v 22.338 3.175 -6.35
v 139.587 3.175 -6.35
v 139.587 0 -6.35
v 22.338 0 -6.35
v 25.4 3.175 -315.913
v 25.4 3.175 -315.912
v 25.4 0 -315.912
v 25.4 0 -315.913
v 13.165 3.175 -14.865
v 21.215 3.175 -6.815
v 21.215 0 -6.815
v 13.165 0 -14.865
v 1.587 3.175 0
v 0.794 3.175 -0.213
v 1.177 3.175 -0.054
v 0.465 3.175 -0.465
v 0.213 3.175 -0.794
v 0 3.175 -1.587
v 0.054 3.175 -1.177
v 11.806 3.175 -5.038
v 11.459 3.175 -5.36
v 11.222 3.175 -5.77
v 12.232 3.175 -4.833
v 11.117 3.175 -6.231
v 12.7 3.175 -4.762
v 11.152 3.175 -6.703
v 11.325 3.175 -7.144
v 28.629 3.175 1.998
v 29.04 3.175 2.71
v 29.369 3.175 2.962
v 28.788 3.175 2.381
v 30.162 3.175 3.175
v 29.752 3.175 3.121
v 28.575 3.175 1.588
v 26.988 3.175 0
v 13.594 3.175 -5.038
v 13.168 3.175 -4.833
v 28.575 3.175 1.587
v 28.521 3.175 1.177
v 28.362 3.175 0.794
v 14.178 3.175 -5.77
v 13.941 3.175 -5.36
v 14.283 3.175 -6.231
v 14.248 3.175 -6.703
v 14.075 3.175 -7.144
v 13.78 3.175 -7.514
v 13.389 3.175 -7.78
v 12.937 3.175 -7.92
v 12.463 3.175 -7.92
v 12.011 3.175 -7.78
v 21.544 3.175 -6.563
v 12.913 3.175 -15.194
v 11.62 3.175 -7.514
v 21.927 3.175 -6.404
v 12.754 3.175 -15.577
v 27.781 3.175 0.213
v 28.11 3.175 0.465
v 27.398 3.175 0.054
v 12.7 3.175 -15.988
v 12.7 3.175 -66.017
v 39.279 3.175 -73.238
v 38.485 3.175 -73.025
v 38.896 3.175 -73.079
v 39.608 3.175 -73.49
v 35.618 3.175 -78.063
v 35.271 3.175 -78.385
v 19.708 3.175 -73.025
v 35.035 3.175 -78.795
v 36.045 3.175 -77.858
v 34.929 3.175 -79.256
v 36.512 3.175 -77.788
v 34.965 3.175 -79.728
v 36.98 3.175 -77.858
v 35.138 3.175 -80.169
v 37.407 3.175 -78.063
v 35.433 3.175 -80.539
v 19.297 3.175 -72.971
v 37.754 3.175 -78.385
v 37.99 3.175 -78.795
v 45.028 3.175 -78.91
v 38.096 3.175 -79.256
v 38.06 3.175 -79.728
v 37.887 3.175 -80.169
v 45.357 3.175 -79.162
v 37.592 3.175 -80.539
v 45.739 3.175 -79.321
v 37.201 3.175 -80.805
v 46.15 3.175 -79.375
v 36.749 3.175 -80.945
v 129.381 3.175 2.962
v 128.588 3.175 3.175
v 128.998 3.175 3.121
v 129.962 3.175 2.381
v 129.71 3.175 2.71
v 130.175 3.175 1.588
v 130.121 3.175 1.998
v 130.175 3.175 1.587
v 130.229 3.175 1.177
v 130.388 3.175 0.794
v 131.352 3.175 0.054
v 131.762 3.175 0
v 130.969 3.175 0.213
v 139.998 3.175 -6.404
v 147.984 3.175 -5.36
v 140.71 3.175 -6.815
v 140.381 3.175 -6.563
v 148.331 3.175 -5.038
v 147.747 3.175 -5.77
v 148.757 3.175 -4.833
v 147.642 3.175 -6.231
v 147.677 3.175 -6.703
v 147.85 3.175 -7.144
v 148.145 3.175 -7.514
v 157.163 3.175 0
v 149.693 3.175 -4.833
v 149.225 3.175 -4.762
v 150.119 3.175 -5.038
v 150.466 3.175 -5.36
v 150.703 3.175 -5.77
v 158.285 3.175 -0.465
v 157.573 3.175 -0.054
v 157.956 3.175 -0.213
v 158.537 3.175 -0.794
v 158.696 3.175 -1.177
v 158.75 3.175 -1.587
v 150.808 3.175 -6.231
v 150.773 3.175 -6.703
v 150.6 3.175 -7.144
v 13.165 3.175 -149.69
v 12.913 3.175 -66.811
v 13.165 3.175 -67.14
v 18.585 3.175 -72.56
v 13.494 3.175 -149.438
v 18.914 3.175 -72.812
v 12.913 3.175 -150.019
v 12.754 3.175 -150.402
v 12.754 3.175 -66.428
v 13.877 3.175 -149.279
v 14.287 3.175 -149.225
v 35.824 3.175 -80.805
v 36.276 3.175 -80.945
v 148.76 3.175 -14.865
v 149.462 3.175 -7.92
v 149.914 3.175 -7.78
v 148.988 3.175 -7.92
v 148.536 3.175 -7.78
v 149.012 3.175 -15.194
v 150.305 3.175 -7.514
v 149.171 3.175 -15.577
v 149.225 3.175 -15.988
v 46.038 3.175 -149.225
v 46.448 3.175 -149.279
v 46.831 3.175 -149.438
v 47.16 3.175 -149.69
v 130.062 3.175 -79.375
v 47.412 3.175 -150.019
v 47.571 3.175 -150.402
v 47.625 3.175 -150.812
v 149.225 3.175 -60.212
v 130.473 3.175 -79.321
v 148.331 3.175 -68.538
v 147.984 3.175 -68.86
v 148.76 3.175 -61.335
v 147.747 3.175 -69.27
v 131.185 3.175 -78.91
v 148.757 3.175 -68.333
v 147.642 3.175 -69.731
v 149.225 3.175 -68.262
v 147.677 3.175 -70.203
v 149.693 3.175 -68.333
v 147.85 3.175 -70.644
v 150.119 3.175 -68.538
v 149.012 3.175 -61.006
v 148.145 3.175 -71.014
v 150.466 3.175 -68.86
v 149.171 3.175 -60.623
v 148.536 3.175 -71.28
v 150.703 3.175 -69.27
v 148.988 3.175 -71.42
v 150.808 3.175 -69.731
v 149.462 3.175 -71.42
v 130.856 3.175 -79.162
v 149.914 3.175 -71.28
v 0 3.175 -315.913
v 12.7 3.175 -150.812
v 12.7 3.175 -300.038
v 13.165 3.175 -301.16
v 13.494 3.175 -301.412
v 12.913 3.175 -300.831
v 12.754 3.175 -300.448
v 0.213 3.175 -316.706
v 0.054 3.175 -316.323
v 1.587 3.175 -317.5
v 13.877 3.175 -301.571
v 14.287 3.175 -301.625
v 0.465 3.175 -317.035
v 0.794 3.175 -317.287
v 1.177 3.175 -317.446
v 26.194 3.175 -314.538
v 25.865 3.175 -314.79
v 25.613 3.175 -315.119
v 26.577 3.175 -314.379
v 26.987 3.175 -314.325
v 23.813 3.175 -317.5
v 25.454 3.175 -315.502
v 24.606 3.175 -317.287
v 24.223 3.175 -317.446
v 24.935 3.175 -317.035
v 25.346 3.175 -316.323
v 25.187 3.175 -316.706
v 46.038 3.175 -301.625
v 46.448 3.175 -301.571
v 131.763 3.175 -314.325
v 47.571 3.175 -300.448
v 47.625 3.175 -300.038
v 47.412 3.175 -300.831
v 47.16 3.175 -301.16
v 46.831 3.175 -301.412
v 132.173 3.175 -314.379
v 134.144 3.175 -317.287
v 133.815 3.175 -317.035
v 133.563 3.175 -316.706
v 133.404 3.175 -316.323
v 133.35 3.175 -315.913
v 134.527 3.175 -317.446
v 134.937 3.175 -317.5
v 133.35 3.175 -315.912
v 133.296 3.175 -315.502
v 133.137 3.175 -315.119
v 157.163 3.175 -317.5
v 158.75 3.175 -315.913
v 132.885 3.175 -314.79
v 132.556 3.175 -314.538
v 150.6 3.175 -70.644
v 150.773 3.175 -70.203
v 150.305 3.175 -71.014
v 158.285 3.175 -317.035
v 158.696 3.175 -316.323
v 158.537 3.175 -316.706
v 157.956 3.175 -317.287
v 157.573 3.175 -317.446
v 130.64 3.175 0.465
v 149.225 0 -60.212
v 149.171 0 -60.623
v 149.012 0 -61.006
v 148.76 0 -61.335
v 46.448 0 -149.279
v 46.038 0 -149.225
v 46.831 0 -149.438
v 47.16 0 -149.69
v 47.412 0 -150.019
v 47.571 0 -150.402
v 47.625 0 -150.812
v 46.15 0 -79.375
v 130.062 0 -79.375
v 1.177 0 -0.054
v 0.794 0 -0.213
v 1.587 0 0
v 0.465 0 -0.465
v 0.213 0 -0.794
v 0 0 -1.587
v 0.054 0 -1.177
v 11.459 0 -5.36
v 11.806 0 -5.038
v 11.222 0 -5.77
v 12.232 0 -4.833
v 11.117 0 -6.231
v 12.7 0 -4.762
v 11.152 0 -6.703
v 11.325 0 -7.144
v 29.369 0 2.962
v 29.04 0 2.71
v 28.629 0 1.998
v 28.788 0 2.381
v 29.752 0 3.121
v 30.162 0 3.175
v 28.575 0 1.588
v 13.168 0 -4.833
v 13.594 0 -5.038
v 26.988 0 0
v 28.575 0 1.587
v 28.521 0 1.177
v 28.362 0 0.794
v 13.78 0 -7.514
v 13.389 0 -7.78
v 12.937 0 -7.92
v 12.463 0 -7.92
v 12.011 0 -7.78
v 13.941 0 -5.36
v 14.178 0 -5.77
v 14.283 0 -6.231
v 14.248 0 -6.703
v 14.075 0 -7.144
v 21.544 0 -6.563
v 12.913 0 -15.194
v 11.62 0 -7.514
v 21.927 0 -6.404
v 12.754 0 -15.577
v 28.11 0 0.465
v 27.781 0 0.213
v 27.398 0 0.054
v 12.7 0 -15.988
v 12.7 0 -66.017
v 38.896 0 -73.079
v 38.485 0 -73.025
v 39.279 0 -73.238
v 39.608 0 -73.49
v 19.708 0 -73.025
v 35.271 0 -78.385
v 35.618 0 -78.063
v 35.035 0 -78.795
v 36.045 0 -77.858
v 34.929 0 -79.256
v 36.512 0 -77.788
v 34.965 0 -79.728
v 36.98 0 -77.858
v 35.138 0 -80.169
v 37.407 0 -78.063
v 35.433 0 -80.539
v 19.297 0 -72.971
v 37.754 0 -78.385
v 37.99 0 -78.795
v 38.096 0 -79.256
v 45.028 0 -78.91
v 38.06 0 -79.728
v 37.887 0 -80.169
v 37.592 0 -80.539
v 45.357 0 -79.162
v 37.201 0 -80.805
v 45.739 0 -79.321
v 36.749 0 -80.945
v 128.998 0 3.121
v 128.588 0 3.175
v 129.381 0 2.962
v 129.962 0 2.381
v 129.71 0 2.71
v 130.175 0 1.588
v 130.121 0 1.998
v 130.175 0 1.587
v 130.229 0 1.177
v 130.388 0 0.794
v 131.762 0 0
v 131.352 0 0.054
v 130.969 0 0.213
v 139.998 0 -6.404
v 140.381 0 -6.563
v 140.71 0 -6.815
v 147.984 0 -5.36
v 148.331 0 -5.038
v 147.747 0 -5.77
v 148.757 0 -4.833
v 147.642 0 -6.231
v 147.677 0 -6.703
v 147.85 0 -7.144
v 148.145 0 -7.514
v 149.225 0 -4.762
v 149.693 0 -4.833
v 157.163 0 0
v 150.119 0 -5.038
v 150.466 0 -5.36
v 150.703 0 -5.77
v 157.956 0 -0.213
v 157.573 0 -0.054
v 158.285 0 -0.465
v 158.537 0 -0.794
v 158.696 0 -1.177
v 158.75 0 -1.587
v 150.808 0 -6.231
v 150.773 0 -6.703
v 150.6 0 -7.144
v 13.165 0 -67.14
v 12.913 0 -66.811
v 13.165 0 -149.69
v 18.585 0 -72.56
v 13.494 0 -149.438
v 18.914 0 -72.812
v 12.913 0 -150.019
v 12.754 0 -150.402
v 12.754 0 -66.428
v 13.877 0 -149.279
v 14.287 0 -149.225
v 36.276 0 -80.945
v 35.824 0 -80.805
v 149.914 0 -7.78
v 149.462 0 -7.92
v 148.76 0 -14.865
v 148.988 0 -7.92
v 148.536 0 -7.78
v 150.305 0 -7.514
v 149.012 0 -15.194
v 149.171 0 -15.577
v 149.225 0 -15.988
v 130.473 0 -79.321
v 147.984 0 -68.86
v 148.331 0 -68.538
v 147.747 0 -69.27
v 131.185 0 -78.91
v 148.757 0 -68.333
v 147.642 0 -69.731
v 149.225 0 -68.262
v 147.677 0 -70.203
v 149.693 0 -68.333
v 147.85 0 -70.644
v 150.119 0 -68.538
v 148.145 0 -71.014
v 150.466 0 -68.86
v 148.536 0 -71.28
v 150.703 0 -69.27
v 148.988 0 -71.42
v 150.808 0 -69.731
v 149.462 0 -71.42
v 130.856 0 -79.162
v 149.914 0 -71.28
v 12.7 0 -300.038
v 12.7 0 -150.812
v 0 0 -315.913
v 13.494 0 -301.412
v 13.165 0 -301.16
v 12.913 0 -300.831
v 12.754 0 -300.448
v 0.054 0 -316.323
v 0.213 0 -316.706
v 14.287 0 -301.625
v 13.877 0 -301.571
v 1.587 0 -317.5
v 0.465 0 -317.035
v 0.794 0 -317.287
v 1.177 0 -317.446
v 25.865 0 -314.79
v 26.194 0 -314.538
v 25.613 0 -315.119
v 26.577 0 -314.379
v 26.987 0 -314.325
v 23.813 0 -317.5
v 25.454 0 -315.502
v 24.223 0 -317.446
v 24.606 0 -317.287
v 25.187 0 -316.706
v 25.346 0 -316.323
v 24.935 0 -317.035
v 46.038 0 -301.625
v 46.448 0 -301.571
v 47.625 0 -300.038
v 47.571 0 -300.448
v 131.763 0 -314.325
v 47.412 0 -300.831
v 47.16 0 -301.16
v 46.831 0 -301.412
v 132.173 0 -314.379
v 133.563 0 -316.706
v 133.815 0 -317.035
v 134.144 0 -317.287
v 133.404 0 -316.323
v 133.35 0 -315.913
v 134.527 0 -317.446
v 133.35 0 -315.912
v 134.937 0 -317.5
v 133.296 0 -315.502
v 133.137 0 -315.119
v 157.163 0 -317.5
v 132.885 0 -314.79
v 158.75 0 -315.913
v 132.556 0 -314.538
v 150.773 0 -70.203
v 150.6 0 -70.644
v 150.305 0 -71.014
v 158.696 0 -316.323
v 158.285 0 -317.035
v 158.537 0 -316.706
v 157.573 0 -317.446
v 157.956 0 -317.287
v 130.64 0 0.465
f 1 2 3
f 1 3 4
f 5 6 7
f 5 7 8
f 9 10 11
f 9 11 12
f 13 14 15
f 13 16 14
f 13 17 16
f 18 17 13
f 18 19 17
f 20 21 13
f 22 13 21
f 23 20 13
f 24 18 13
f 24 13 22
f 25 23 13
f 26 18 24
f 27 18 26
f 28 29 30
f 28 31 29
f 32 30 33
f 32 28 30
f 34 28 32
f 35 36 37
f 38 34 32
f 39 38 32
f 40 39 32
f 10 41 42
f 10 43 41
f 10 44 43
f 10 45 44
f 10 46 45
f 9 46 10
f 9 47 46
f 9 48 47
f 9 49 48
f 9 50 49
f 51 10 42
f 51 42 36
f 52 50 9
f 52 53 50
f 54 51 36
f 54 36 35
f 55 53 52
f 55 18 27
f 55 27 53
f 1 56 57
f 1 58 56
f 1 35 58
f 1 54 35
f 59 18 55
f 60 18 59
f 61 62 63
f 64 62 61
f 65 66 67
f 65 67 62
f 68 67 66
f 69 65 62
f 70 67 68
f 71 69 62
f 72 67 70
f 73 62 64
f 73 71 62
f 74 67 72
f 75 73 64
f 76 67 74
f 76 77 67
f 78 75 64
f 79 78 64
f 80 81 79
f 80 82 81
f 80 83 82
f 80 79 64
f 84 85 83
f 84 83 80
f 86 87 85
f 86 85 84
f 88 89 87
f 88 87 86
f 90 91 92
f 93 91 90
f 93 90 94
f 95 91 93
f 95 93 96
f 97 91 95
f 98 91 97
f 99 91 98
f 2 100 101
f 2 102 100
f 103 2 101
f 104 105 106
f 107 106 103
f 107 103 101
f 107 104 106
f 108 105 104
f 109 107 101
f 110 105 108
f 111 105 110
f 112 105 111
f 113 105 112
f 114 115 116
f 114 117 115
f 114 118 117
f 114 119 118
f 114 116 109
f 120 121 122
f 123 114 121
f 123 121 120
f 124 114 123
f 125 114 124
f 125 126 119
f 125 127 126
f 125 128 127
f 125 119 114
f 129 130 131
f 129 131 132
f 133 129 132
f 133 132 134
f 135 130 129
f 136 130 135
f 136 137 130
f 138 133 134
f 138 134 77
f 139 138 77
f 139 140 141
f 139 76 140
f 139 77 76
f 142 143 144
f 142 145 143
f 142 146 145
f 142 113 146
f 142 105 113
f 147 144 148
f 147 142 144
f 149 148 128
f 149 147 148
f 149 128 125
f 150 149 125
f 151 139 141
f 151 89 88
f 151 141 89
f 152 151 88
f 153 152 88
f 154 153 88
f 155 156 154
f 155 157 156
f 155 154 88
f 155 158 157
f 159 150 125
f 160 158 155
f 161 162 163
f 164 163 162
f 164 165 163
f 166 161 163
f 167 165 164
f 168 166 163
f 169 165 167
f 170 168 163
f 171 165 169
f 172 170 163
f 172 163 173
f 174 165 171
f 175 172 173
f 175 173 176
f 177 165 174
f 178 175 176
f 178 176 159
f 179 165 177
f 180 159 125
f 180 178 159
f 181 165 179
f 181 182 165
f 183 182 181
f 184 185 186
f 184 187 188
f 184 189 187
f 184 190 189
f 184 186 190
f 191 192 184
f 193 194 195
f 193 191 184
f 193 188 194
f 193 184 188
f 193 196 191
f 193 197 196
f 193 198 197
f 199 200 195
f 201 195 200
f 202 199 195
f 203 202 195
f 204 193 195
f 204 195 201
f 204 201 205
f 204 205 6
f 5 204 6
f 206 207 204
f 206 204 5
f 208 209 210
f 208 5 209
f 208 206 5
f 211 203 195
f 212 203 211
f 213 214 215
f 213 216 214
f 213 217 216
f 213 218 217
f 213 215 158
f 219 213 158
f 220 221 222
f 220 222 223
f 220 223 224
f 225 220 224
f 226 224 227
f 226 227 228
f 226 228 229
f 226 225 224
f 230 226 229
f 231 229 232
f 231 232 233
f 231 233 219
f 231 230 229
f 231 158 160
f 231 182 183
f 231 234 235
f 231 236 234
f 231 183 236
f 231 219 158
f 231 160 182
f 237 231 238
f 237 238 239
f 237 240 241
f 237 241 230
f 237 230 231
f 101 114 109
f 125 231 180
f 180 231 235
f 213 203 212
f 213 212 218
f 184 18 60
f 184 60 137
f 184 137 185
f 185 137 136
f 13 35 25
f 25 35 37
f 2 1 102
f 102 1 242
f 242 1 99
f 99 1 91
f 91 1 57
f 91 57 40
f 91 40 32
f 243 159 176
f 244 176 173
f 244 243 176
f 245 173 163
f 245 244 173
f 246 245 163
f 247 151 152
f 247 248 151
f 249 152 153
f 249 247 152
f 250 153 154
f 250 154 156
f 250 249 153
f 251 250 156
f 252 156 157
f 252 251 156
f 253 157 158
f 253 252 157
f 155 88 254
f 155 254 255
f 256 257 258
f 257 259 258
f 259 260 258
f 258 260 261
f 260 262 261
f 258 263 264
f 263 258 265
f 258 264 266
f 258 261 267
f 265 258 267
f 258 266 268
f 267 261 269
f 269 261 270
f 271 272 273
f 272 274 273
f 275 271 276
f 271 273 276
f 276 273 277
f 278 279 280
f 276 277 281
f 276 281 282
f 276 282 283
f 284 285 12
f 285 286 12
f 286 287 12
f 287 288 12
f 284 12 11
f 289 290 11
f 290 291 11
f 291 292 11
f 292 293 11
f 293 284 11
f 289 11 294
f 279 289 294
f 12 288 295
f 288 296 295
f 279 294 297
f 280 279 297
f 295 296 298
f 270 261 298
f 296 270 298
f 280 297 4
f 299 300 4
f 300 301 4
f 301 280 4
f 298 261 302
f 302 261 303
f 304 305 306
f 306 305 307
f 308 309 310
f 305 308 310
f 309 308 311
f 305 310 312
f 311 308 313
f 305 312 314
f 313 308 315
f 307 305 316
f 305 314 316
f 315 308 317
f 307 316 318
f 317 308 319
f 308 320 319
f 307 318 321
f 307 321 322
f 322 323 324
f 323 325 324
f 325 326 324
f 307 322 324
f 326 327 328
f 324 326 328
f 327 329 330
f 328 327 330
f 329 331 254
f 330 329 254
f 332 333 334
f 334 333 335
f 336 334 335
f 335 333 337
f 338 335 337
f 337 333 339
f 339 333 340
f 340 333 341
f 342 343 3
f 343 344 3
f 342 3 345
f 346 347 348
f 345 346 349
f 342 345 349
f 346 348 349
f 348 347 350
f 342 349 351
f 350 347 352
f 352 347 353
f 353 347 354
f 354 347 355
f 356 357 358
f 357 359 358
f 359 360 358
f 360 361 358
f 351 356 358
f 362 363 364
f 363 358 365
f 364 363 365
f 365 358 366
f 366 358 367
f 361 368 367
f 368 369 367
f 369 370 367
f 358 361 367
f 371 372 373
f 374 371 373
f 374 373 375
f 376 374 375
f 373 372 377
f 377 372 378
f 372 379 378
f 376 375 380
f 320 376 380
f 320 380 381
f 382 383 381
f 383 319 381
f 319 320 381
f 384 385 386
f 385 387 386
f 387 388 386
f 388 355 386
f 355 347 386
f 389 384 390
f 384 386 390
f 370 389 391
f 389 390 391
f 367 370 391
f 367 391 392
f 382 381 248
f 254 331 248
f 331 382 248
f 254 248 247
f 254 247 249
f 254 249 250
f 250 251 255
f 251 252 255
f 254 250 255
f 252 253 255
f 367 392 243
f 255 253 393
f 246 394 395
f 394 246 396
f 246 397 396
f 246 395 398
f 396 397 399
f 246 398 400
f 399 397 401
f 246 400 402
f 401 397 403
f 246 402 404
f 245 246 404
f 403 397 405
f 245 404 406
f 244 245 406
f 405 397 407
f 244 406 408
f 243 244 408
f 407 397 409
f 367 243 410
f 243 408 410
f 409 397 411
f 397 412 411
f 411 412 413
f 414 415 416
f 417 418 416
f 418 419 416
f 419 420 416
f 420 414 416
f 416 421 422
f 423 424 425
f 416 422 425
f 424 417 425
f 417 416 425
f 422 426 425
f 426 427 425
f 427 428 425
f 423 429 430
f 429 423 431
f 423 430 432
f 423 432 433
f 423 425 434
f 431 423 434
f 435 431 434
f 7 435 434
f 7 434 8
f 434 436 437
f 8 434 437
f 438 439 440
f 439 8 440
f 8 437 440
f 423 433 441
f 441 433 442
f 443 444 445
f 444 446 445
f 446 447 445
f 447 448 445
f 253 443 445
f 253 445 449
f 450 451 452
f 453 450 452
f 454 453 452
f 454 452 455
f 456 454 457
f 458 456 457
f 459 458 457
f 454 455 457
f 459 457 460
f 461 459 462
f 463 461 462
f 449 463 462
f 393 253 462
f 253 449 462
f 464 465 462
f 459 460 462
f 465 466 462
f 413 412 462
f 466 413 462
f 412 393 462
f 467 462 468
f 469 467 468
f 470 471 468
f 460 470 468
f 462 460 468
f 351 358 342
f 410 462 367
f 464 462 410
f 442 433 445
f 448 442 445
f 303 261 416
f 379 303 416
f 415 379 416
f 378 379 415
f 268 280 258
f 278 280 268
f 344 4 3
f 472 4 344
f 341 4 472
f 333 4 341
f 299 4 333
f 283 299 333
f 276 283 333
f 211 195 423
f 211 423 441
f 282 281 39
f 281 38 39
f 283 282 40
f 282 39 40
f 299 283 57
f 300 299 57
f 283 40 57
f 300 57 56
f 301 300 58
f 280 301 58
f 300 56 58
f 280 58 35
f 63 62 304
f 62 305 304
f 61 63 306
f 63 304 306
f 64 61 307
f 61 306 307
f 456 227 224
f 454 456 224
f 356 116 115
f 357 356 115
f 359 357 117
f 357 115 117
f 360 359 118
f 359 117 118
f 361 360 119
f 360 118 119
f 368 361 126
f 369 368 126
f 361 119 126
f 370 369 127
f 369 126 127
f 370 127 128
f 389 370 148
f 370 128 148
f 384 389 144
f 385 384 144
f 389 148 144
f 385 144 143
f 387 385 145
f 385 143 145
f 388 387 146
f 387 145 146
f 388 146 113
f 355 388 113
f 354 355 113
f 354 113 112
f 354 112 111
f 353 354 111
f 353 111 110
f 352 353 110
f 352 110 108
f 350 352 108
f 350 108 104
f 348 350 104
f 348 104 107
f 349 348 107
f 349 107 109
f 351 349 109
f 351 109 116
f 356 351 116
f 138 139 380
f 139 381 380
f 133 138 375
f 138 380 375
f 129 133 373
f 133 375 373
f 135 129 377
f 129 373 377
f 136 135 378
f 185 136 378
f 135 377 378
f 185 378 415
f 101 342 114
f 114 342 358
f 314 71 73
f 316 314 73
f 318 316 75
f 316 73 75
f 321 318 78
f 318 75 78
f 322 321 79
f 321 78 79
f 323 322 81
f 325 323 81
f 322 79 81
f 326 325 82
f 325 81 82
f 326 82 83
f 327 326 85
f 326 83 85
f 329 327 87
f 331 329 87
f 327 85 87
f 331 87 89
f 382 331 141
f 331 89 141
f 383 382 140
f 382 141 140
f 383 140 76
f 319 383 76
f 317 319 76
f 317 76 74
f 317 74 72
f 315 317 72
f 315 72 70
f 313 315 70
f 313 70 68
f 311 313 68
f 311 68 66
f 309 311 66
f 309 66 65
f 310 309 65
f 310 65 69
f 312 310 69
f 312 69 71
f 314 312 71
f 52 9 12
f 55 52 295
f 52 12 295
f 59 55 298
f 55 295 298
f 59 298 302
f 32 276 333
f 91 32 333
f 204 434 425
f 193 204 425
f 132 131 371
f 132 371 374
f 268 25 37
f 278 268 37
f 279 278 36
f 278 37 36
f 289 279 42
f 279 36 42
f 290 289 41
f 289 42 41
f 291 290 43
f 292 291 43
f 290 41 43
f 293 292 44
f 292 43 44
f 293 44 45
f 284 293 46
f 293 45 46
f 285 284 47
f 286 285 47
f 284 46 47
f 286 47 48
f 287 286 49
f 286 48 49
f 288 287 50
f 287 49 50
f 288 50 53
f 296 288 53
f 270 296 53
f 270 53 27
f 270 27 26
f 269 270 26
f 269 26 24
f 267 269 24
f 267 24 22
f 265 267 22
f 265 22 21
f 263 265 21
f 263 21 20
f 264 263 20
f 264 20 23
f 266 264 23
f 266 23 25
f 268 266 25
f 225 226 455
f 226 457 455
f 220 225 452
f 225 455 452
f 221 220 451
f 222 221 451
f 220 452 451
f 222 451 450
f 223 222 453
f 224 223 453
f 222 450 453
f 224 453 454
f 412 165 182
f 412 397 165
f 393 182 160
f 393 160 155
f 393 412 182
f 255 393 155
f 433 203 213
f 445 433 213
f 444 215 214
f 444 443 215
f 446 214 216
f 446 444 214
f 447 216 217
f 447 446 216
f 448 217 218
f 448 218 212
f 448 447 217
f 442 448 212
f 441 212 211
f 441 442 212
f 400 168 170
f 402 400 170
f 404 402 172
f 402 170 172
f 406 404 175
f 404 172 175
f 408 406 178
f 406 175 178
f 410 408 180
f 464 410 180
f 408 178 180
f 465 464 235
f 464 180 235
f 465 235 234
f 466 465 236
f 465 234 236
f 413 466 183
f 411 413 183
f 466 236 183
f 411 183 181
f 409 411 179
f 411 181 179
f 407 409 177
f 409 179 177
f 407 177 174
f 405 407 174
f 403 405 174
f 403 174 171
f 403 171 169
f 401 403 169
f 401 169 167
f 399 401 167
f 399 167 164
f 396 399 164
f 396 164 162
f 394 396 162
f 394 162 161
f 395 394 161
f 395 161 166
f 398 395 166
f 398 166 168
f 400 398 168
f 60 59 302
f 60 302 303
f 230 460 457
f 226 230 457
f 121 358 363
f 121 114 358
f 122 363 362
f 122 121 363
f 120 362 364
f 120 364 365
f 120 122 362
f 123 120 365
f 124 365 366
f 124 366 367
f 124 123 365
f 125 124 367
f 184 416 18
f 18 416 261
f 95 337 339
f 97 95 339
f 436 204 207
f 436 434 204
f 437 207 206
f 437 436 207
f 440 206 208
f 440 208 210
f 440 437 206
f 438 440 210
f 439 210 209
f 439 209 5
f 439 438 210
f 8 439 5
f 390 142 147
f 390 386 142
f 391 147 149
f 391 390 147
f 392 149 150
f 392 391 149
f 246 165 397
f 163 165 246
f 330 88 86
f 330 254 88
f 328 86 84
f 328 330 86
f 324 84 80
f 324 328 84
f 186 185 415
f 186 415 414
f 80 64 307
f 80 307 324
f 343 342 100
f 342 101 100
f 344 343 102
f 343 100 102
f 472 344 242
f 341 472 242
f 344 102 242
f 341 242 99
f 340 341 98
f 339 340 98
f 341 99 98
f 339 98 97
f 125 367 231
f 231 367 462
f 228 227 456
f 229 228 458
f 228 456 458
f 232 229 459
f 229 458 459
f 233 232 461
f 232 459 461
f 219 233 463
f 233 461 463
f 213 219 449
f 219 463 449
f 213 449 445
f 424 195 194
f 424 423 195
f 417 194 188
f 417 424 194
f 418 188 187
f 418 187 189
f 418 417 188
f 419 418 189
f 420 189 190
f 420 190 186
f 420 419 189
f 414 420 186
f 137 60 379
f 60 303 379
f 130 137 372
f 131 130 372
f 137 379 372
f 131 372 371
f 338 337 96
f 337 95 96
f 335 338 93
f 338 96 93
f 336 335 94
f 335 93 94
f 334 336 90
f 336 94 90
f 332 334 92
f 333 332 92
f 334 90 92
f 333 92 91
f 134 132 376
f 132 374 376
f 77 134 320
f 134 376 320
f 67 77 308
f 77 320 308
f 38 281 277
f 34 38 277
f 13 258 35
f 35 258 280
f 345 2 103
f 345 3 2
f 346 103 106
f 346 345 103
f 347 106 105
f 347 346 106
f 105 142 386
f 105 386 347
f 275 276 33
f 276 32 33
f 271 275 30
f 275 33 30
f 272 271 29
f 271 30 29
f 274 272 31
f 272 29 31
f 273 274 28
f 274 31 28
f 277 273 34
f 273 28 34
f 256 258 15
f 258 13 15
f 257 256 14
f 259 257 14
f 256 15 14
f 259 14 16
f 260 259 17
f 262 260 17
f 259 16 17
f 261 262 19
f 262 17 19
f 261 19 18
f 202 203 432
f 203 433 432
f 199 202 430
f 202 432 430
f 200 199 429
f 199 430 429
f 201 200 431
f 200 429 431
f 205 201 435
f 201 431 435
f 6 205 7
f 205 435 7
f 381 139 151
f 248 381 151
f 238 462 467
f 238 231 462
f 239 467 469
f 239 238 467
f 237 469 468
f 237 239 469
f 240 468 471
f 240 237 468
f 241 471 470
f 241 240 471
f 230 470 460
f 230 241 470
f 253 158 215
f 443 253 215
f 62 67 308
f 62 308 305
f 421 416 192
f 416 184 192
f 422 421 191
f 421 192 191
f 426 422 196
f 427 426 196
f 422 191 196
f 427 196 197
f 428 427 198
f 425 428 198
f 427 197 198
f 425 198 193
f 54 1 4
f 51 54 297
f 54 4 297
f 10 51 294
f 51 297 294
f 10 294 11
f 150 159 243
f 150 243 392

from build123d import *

# Parameters (mm, degrees)
BOSS_EXTRUDE1_DEPTH = 3.175
SKETCH2_W           = 107.95
SKETCH2_H           = 3.175
CUT_EXTRUDE1_DEPTH  = 355.989990176
SKETCH3_R           = 1.5875
CUT_EXTRUDE2_DEPTH  = 355.989990176
SKETCH4_W           = 34.925
SKETCH4_H           = 152.4
CUT_EXTRUDE3_DEPTH  = 355.989990176
FILLET1_R           = 1.5875


with BuildPart() as part:
    # Sketch1 → Boss-Extrude1 (new body)
    with BuildSketch(Plane(origin=(0, 0, 0), x_dir=(1, 0, 0), z_dir=(0, 1, 0))):
        Polygon((130.175, 0), (158.75, 0), (158.75, 317.5), (0, 317.5), (0, 0), (28.575, 0), (28.575, -3.175), (130.175, -3.175), align=None)
    extrude(amount=BOSS_EXTRUDE1_DEPTH)

    # Sketch2 → Cut-Extrude1 (cut, through all)
    with BuildSketch(Plane(origin=(0, 3.175, 0), x_dir=(1, 0, 0), z_dir=(0, 1, 0))):
        with Locations((79.375, 315.9125)):
            Rectangle(SKETCH2_W, SKETCH2_H)
    extrude(amount=-CUT_EXTRUDE1_DEPTH, mode=Mode.SUBTRACT)

    # Sketch3 → Cut-Extrude2 (cut, through all)
    with BuildSketch(Plane(origin=(0, 3.175, 0), x_dir=(1, 0, 0), z_dir=(0, 1, 0))):
        with Locations(Location((12.7, 6.35, 0), (0, 0, 270))):
            Circle(SKETCH3_R)
        with Locations(Location((149.225, 6.35, 0), (0, 0, 270))):
            Circle(SKETCH3_R)
        with Locations(Location((149.225, 69.85, 0), (0, 0, 270))):
            Circle(SKETCH3_R)
        with Locations(Location((36.5125, 79.375, 0), (0, 0, 270))):
            Circle(SKETCH3_R)
        Polygon((21.680256121, 6.35), (12.7, 15.330256121), (12.7, 66.675), (19.05, 73.025), (39.142756121, 73.025), (45.492756121, 79.375), (130.719743879, 79.375), (149.225, 60.869743879), (149.225, 15.330256121), (140.244743879, 6.35), align=None)
    extrude(amount=-CUT_EXTRUDE2_DEPTH, mode=Mode.SUBTRACT)

    # Sketch4 → Cut-Extrude3 (cut, through all)
    with BuildSketch(Plane(origin=(0, 3.175, 0), x_dir=(1, 0, 0), z_dir=(0, 1, 0))):
        with Locations((30.1625, 225.425)):
            Rectangle(SKETCH4_W, SKETCH4_H)
    extrude(amount=-CUT_EXTRUDE3_DEPTH, mode=Mode.SUBTRACT)

    # Fillet1
    fillet1_edges = [part.edges().sort_by_distance(p)[0] for p in [
        (25.4, 1.5875, -314.325),
        (25.4, 1.5875, -317.5),
        (0, 1.5875, -317.5),
        (0, 1.5875, 0),
        (28.575, 1.5875, 0),
        (28.575, 1.5875, 3.175),
        (130.175, 1.5875, 3.175),
        (130.175, 1.5875, 0),
        (158.75, 1.5875, 0),
        (158.75, 1.5875, -317.5),
        (133.35, 1.5875, -317.5),
        (133.35, 1.5875, -314.325),
        (140.244743879, 1.5875, -6.35),
        (149.225, 1.5875, -15.330256121),
        (149.225, 1.5875, -60.869743879),
        (130.719743879, 1.5875, -79.375),
        (45.492756121, 1.5875, -79.375),
        (39.142756121, 1.5875, -73.025),
        (19.05, 1.5875, -73.025),
        (12.7, 1.5875, -66.675),
        (21.680256121, 1.5875, -6.35),
        (12.7, 1.5875, -15.330256121),
        (12.7, 1.5875, -149.225),
        (47.625, 1.5875, -149.225),
        (12.7, 1.5875, -301.625),
        (47.625, 1.5875, -301.625),
    ]]
    fillet(fillet1_edges, radius=FILLET1_R - 0.0001)  # a hair under: the kernel refuses the full size


solid = part.part
